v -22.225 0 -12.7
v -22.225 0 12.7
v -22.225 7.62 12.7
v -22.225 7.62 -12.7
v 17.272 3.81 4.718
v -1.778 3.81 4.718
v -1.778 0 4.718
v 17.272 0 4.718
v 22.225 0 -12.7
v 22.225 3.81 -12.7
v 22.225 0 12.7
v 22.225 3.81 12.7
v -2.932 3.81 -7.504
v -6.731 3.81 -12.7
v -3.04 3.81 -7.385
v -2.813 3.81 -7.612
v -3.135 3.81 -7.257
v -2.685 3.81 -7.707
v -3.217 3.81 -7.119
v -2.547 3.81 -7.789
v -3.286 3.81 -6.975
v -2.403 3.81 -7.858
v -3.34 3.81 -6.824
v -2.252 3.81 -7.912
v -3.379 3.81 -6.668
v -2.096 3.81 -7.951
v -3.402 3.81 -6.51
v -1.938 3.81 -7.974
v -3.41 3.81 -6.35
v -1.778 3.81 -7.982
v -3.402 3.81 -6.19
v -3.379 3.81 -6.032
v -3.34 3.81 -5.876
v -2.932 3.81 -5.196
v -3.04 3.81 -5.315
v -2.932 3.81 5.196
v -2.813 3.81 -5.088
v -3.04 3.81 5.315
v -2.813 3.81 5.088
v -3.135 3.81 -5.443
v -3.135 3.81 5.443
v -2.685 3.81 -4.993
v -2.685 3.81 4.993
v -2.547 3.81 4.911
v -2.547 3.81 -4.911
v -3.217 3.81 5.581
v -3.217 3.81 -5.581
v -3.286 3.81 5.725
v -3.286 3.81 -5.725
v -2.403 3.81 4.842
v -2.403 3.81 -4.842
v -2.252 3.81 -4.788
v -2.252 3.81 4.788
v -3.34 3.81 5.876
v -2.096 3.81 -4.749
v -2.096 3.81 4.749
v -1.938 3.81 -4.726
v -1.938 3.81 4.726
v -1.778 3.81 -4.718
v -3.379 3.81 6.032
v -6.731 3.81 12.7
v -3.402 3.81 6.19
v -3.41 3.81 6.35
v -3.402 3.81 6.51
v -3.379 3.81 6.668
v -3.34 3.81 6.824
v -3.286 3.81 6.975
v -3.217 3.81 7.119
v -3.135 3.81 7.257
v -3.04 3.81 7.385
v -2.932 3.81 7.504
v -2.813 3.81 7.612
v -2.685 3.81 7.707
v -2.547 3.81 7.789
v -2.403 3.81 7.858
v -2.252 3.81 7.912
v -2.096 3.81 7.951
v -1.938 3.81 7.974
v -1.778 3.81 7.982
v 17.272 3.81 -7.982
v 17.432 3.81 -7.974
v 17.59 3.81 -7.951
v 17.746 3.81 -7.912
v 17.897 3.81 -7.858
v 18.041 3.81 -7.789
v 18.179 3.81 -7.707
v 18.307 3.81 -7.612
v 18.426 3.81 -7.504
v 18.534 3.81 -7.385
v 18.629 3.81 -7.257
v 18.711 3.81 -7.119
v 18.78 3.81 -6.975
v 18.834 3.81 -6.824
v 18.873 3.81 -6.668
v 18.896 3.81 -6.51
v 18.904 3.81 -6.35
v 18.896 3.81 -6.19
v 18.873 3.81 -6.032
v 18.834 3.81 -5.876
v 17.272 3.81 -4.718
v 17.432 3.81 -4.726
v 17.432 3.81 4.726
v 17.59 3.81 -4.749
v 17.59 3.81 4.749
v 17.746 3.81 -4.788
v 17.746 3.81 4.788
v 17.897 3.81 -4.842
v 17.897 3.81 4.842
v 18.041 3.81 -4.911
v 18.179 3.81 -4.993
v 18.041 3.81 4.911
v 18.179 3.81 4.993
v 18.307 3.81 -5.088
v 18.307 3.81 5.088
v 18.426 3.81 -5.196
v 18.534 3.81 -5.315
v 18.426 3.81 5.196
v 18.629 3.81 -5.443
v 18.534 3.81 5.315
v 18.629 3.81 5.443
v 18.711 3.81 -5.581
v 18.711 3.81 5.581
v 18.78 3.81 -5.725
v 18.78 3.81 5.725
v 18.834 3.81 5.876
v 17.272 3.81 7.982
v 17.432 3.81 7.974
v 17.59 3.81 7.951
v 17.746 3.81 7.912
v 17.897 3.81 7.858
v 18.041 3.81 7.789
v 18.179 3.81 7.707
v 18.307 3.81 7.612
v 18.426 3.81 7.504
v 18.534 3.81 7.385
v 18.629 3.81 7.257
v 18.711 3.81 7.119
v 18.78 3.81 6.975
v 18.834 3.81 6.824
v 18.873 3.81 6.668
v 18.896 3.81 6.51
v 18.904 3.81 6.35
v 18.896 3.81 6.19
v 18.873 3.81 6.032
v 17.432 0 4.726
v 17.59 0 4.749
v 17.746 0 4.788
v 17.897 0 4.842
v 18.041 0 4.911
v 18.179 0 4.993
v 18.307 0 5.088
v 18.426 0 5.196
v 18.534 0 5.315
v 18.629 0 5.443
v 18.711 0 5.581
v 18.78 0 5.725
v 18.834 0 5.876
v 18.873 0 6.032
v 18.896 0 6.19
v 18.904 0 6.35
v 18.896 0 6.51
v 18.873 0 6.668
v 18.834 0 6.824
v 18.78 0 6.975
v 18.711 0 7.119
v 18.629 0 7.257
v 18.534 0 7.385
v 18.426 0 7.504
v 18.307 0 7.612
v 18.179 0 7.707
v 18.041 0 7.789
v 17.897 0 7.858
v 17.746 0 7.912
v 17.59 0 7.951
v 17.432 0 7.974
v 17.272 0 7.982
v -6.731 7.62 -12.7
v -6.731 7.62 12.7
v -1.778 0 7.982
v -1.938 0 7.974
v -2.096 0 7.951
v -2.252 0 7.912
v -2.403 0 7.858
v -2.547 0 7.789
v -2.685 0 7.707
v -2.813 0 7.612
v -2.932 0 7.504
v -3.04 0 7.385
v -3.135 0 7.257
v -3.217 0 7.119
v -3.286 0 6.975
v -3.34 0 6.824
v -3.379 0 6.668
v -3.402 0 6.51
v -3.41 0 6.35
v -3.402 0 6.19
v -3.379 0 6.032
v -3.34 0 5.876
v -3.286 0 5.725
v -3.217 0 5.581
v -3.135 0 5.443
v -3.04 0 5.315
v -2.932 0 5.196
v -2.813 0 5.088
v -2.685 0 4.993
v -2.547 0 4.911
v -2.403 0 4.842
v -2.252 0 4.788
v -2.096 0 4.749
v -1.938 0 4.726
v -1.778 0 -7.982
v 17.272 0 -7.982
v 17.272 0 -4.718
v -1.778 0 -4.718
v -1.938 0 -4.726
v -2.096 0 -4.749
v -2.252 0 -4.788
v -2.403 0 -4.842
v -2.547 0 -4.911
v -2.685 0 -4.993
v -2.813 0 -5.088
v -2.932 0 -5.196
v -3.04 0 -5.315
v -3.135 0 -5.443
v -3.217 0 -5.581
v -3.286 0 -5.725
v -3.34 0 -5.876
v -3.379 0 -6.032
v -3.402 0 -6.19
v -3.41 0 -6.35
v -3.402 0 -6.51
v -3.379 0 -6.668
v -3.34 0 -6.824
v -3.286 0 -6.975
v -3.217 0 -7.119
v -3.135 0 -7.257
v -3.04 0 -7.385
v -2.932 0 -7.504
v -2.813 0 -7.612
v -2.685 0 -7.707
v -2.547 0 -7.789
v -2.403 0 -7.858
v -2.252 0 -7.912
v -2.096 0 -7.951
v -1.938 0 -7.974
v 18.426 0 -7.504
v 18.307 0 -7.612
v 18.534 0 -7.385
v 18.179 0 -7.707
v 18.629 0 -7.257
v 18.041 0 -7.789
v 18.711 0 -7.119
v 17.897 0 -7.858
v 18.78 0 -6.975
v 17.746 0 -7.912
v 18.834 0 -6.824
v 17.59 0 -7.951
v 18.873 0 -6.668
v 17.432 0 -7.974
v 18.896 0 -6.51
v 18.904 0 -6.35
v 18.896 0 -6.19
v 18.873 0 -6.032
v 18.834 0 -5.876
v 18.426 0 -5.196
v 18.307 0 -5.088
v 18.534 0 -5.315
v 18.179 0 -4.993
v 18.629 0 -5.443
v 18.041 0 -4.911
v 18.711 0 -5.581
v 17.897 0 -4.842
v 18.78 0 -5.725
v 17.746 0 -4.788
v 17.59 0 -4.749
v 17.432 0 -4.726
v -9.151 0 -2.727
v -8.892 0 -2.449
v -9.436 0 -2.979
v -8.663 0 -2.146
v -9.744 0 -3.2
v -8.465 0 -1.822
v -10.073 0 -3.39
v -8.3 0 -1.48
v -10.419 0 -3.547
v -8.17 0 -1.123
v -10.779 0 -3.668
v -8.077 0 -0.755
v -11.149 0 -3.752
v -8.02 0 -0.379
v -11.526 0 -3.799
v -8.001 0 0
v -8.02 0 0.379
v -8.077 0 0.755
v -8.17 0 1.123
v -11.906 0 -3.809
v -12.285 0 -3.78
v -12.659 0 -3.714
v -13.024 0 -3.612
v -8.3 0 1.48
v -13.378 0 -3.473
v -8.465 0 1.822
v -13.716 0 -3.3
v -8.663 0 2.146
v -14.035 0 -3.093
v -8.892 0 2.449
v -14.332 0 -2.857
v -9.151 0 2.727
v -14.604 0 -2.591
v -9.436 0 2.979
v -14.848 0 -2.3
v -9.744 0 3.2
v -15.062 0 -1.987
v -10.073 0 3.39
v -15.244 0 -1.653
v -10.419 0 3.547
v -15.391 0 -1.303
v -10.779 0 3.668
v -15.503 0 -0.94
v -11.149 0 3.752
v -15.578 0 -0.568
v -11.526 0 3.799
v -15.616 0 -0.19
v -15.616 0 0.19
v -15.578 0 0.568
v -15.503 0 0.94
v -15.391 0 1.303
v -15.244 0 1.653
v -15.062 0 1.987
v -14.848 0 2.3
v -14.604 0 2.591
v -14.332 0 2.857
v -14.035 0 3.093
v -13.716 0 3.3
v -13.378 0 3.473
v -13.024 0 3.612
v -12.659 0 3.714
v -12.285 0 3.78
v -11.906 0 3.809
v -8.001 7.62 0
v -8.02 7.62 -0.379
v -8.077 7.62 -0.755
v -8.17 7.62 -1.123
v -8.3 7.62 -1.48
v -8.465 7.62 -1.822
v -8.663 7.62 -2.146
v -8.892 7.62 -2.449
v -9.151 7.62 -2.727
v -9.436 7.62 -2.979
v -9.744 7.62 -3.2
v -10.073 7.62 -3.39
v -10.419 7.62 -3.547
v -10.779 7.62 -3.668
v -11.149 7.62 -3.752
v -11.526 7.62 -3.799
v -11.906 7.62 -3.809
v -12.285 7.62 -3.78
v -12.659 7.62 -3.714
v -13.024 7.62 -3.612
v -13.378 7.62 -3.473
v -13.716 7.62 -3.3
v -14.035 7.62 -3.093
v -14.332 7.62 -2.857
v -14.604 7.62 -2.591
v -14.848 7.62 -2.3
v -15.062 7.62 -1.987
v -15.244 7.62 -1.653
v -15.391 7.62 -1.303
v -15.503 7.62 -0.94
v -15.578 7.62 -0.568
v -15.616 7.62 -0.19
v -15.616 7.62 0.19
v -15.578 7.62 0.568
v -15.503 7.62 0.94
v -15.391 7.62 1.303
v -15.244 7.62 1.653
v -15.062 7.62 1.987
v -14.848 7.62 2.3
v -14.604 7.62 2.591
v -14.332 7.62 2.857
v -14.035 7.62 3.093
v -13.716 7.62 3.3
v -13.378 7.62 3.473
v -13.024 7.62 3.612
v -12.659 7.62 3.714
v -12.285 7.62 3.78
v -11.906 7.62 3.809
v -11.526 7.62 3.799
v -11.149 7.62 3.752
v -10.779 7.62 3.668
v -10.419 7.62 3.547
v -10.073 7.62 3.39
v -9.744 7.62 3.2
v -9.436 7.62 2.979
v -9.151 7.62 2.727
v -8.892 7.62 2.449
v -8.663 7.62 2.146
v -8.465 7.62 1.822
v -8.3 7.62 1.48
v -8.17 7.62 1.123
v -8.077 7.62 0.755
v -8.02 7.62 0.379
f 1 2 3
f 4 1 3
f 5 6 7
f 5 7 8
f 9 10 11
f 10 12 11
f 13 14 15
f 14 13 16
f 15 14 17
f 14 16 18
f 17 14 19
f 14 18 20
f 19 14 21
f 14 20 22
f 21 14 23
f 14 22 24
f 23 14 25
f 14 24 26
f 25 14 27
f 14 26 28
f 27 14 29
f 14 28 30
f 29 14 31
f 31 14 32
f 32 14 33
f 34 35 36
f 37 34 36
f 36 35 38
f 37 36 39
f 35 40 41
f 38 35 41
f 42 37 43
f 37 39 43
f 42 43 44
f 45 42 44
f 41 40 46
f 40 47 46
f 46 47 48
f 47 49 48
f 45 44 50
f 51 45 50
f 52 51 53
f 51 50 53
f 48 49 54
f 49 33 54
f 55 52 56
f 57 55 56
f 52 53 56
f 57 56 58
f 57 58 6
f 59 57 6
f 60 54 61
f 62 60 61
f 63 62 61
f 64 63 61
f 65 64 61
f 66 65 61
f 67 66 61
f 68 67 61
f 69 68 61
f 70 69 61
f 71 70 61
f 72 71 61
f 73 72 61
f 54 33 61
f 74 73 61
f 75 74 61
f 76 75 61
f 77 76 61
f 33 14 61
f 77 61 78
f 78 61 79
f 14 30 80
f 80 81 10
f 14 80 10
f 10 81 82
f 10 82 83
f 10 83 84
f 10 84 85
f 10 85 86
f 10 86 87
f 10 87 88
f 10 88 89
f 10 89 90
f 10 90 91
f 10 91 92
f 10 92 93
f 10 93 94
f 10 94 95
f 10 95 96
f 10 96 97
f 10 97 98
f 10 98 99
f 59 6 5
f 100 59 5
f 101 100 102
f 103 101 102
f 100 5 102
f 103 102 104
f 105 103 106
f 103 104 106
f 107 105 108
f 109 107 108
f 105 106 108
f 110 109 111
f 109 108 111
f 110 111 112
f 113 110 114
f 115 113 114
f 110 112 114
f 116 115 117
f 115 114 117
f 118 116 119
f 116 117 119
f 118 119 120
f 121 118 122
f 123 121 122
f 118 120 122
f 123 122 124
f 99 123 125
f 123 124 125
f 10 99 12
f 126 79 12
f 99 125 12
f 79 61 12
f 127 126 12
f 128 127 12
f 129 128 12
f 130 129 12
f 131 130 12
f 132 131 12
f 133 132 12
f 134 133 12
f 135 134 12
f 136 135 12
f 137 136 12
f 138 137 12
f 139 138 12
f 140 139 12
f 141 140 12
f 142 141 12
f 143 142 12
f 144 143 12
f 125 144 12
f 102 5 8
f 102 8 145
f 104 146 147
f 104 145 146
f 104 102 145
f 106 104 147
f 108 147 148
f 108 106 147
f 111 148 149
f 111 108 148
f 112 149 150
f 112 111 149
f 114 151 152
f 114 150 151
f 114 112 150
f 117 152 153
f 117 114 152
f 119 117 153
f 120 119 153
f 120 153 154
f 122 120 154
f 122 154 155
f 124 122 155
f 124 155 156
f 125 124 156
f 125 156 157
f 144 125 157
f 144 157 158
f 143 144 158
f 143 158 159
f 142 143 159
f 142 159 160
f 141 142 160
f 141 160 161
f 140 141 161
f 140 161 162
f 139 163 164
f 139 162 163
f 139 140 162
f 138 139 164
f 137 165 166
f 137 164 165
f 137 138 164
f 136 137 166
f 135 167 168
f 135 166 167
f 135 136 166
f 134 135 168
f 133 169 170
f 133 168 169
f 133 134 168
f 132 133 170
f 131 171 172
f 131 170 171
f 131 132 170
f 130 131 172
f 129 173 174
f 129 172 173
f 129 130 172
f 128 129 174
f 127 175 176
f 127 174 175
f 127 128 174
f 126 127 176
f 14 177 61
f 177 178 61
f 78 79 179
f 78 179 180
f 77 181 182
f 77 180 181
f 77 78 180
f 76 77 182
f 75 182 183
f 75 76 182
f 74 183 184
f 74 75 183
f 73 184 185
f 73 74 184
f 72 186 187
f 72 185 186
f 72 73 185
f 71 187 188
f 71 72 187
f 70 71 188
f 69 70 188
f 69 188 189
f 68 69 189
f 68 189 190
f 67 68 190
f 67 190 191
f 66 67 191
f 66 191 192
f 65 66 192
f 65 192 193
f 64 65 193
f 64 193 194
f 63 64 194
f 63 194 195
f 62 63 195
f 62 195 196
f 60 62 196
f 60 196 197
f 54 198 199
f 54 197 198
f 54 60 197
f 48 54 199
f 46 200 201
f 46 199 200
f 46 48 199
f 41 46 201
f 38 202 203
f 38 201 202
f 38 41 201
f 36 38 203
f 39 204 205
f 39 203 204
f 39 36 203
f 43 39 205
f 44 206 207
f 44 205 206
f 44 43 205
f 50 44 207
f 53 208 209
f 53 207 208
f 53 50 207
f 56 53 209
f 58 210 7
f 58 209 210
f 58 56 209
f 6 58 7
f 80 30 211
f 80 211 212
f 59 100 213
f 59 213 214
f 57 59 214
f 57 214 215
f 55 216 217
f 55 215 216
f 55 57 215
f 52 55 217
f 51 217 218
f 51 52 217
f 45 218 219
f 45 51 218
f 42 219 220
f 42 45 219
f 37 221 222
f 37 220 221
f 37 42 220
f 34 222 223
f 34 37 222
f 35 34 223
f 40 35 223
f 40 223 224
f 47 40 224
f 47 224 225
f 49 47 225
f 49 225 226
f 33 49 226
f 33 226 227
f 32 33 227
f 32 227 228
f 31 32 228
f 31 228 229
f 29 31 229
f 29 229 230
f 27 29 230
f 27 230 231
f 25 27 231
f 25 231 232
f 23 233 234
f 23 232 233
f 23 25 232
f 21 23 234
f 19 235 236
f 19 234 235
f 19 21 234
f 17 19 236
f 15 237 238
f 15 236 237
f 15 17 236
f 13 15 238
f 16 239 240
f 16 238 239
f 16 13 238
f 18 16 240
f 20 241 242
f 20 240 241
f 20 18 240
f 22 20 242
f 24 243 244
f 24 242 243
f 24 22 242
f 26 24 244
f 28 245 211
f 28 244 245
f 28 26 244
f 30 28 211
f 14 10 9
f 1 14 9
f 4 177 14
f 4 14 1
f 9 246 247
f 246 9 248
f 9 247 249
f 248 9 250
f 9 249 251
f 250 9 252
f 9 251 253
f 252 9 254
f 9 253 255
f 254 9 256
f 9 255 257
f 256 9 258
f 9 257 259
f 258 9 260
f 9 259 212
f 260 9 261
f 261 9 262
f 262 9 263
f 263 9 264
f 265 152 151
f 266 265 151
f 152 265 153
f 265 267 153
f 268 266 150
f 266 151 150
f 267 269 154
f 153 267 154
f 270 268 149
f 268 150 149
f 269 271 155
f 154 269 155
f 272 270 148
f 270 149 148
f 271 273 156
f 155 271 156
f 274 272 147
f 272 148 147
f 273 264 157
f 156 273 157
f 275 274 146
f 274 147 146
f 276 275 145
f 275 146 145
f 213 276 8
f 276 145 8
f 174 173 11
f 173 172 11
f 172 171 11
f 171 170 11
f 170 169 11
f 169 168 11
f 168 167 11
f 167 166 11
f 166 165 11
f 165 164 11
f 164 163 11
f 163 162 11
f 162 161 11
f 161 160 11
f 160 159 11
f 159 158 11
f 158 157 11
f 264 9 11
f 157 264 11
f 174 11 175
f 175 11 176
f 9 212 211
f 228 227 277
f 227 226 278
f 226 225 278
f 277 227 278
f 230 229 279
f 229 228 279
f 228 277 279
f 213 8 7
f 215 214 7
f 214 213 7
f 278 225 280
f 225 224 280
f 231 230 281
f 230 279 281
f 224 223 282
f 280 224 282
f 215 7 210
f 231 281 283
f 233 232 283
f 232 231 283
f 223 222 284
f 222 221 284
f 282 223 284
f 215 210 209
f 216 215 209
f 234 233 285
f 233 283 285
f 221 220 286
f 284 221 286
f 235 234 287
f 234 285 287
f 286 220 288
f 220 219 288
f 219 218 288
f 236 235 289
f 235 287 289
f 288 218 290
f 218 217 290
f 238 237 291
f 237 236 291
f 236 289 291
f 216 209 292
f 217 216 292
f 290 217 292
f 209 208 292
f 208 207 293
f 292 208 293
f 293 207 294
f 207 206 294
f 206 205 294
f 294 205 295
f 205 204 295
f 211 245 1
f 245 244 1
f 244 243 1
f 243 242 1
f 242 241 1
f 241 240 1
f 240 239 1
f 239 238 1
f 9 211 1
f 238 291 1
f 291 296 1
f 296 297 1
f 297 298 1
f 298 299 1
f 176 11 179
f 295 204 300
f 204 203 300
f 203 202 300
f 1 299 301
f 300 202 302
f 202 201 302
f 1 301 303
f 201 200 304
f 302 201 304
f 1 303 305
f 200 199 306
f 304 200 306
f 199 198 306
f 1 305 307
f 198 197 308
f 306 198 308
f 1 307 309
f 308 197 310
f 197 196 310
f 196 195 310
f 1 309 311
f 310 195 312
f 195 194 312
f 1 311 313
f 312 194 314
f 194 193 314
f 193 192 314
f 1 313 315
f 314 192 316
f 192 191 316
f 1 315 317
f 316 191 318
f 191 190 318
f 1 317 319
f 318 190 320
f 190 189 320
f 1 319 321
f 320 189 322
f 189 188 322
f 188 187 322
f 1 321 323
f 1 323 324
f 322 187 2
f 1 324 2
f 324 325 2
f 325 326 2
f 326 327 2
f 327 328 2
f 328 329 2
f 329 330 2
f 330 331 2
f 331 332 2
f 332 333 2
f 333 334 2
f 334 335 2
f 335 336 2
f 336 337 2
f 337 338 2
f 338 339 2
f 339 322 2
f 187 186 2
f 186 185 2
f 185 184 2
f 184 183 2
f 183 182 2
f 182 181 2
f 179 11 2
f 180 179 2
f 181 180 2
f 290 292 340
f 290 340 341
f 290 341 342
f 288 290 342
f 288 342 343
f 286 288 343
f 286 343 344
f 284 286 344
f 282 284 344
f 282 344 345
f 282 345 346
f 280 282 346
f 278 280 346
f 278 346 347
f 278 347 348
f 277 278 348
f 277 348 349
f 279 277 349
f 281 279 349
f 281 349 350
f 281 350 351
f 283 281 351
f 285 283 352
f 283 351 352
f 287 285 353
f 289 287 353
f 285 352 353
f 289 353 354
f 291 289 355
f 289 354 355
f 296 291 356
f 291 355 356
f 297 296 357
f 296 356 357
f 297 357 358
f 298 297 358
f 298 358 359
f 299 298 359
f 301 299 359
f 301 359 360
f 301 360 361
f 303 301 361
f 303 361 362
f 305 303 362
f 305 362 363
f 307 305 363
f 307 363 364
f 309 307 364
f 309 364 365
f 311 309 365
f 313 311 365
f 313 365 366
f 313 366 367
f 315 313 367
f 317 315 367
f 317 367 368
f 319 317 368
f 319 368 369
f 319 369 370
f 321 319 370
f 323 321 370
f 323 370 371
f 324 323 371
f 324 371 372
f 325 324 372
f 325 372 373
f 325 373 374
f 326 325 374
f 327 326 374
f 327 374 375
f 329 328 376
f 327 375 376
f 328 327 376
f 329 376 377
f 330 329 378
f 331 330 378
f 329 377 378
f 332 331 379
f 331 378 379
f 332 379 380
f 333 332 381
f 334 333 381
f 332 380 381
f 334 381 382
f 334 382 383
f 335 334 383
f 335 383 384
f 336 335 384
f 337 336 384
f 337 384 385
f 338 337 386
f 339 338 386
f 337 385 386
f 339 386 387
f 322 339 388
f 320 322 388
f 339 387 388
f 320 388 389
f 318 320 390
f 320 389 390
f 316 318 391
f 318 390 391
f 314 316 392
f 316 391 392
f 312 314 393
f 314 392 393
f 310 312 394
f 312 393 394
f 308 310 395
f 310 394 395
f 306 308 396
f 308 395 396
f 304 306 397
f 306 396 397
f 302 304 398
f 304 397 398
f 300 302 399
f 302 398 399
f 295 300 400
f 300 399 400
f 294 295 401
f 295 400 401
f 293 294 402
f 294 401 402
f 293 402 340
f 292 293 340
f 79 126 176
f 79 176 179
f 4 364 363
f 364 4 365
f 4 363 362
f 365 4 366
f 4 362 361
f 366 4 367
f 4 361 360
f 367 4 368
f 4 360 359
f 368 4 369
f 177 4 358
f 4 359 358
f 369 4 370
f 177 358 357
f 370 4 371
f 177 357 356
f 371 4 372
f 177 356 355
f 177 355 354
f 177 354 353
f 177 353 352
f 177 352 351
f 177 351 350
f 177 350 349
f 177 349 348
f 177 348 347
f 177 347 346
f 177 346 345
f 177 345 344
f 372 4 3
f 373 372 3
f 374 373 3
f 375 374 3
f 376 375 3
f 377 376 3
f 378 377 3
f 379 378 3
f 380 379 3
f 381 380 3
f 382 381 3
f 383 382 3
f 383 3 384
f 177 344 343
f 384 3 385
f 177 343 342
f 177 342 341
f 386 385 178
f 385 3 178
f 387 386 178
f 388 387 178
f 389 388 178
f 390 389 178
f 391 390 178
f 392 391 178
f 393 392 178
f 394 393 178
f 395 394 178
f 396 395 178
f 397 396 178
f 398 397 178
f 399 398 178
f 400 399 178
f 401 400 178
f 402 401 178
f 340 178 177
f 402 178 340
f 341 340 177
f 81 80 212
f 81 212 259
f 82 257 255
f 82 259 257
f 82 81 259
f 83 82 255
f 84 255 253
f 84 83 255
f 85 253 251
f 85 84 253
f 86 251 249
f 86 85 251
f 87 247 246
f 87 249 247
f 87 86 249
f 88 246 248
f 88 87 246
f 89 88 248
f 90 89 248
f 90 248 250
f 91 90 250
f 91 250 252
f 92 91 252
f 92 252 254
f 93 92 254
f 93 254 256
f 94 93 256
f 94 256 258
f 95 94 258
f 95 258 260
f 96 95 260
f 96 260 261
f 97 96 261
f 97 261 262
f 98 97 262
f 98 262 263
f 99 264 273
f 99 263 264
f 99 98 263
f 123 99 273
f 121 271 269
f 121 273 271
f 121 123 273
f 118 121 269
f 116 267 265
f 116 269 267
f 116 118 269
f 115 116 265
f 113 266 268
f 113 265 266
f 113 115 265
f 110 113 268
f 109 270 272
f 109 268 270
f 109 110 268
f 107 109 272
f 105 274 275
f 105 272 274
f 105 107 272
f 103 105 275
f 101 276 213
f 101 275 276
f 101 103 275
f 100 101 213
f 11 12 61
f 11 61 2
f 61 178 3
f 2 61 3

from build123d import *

# Parameters (mm, degrees)
BOSS_EXTRUDE1_DEPTH = 12.7
SKETCH2_R           = 3.81
CUT_EXTRUDE1_DEPTH  = 8.62


with BuildPart() as part:
    # Sketch1 → Boss-Extrude1 (new body, symmetric)
    with BuildSketch(Plane.XY):
        Polygon((-22.225, 7.62), (-6.731, 7.62), (-6.731, 3.81), (22.225, 3.81), (22.225, 0), (-22.225, 0), align=None)
    extrude(amount=BOSS_EXTRUDE1_DEPTH, both=True)

    # Sketch2 → Cut-Extrude1 (cut, through all)
    with BuildSketch(Plane(origin=(0, 7.62, 0), x_dir=(1, 0, 0), z_dir=(0, 1, 0))):
        with Locations((-11.811, 0)):
            Circle(SKETCH2_R)
        with BuildLine():
            Line((-1.778, 7.98195), (17.272, 7.98195))
            ThreePointArc((17.272, 7.98195), (18.90395, 6.35), (17.272, 4.71805))
            Line((17.272, 4.71805), (-1.778, 4.71805))
            ThreePointArc((-1.778, 4.71805), (-3.40995, 6.35), (-1.778, 7.98195))
        make_face()
        with BuildLine():
            Line((-1.778, -4.71805), (17.272, -4.71805))
            ThreePointArc((17.272, -4.71805), (18.90395, -6.35), (17.272, -7.98195))
            Line((17.272, -7.98195), (-1.778, -7.98195))
            ThreePointArc((-1.778, -7.98195), (-3.40995, -6.35), (-1.778, -4.71805))
        make_face()
    extrude(amount=-CUT_EXTRUDE1_DEPTH, mode=Mode.SUBTRACT)


solid = part.part
